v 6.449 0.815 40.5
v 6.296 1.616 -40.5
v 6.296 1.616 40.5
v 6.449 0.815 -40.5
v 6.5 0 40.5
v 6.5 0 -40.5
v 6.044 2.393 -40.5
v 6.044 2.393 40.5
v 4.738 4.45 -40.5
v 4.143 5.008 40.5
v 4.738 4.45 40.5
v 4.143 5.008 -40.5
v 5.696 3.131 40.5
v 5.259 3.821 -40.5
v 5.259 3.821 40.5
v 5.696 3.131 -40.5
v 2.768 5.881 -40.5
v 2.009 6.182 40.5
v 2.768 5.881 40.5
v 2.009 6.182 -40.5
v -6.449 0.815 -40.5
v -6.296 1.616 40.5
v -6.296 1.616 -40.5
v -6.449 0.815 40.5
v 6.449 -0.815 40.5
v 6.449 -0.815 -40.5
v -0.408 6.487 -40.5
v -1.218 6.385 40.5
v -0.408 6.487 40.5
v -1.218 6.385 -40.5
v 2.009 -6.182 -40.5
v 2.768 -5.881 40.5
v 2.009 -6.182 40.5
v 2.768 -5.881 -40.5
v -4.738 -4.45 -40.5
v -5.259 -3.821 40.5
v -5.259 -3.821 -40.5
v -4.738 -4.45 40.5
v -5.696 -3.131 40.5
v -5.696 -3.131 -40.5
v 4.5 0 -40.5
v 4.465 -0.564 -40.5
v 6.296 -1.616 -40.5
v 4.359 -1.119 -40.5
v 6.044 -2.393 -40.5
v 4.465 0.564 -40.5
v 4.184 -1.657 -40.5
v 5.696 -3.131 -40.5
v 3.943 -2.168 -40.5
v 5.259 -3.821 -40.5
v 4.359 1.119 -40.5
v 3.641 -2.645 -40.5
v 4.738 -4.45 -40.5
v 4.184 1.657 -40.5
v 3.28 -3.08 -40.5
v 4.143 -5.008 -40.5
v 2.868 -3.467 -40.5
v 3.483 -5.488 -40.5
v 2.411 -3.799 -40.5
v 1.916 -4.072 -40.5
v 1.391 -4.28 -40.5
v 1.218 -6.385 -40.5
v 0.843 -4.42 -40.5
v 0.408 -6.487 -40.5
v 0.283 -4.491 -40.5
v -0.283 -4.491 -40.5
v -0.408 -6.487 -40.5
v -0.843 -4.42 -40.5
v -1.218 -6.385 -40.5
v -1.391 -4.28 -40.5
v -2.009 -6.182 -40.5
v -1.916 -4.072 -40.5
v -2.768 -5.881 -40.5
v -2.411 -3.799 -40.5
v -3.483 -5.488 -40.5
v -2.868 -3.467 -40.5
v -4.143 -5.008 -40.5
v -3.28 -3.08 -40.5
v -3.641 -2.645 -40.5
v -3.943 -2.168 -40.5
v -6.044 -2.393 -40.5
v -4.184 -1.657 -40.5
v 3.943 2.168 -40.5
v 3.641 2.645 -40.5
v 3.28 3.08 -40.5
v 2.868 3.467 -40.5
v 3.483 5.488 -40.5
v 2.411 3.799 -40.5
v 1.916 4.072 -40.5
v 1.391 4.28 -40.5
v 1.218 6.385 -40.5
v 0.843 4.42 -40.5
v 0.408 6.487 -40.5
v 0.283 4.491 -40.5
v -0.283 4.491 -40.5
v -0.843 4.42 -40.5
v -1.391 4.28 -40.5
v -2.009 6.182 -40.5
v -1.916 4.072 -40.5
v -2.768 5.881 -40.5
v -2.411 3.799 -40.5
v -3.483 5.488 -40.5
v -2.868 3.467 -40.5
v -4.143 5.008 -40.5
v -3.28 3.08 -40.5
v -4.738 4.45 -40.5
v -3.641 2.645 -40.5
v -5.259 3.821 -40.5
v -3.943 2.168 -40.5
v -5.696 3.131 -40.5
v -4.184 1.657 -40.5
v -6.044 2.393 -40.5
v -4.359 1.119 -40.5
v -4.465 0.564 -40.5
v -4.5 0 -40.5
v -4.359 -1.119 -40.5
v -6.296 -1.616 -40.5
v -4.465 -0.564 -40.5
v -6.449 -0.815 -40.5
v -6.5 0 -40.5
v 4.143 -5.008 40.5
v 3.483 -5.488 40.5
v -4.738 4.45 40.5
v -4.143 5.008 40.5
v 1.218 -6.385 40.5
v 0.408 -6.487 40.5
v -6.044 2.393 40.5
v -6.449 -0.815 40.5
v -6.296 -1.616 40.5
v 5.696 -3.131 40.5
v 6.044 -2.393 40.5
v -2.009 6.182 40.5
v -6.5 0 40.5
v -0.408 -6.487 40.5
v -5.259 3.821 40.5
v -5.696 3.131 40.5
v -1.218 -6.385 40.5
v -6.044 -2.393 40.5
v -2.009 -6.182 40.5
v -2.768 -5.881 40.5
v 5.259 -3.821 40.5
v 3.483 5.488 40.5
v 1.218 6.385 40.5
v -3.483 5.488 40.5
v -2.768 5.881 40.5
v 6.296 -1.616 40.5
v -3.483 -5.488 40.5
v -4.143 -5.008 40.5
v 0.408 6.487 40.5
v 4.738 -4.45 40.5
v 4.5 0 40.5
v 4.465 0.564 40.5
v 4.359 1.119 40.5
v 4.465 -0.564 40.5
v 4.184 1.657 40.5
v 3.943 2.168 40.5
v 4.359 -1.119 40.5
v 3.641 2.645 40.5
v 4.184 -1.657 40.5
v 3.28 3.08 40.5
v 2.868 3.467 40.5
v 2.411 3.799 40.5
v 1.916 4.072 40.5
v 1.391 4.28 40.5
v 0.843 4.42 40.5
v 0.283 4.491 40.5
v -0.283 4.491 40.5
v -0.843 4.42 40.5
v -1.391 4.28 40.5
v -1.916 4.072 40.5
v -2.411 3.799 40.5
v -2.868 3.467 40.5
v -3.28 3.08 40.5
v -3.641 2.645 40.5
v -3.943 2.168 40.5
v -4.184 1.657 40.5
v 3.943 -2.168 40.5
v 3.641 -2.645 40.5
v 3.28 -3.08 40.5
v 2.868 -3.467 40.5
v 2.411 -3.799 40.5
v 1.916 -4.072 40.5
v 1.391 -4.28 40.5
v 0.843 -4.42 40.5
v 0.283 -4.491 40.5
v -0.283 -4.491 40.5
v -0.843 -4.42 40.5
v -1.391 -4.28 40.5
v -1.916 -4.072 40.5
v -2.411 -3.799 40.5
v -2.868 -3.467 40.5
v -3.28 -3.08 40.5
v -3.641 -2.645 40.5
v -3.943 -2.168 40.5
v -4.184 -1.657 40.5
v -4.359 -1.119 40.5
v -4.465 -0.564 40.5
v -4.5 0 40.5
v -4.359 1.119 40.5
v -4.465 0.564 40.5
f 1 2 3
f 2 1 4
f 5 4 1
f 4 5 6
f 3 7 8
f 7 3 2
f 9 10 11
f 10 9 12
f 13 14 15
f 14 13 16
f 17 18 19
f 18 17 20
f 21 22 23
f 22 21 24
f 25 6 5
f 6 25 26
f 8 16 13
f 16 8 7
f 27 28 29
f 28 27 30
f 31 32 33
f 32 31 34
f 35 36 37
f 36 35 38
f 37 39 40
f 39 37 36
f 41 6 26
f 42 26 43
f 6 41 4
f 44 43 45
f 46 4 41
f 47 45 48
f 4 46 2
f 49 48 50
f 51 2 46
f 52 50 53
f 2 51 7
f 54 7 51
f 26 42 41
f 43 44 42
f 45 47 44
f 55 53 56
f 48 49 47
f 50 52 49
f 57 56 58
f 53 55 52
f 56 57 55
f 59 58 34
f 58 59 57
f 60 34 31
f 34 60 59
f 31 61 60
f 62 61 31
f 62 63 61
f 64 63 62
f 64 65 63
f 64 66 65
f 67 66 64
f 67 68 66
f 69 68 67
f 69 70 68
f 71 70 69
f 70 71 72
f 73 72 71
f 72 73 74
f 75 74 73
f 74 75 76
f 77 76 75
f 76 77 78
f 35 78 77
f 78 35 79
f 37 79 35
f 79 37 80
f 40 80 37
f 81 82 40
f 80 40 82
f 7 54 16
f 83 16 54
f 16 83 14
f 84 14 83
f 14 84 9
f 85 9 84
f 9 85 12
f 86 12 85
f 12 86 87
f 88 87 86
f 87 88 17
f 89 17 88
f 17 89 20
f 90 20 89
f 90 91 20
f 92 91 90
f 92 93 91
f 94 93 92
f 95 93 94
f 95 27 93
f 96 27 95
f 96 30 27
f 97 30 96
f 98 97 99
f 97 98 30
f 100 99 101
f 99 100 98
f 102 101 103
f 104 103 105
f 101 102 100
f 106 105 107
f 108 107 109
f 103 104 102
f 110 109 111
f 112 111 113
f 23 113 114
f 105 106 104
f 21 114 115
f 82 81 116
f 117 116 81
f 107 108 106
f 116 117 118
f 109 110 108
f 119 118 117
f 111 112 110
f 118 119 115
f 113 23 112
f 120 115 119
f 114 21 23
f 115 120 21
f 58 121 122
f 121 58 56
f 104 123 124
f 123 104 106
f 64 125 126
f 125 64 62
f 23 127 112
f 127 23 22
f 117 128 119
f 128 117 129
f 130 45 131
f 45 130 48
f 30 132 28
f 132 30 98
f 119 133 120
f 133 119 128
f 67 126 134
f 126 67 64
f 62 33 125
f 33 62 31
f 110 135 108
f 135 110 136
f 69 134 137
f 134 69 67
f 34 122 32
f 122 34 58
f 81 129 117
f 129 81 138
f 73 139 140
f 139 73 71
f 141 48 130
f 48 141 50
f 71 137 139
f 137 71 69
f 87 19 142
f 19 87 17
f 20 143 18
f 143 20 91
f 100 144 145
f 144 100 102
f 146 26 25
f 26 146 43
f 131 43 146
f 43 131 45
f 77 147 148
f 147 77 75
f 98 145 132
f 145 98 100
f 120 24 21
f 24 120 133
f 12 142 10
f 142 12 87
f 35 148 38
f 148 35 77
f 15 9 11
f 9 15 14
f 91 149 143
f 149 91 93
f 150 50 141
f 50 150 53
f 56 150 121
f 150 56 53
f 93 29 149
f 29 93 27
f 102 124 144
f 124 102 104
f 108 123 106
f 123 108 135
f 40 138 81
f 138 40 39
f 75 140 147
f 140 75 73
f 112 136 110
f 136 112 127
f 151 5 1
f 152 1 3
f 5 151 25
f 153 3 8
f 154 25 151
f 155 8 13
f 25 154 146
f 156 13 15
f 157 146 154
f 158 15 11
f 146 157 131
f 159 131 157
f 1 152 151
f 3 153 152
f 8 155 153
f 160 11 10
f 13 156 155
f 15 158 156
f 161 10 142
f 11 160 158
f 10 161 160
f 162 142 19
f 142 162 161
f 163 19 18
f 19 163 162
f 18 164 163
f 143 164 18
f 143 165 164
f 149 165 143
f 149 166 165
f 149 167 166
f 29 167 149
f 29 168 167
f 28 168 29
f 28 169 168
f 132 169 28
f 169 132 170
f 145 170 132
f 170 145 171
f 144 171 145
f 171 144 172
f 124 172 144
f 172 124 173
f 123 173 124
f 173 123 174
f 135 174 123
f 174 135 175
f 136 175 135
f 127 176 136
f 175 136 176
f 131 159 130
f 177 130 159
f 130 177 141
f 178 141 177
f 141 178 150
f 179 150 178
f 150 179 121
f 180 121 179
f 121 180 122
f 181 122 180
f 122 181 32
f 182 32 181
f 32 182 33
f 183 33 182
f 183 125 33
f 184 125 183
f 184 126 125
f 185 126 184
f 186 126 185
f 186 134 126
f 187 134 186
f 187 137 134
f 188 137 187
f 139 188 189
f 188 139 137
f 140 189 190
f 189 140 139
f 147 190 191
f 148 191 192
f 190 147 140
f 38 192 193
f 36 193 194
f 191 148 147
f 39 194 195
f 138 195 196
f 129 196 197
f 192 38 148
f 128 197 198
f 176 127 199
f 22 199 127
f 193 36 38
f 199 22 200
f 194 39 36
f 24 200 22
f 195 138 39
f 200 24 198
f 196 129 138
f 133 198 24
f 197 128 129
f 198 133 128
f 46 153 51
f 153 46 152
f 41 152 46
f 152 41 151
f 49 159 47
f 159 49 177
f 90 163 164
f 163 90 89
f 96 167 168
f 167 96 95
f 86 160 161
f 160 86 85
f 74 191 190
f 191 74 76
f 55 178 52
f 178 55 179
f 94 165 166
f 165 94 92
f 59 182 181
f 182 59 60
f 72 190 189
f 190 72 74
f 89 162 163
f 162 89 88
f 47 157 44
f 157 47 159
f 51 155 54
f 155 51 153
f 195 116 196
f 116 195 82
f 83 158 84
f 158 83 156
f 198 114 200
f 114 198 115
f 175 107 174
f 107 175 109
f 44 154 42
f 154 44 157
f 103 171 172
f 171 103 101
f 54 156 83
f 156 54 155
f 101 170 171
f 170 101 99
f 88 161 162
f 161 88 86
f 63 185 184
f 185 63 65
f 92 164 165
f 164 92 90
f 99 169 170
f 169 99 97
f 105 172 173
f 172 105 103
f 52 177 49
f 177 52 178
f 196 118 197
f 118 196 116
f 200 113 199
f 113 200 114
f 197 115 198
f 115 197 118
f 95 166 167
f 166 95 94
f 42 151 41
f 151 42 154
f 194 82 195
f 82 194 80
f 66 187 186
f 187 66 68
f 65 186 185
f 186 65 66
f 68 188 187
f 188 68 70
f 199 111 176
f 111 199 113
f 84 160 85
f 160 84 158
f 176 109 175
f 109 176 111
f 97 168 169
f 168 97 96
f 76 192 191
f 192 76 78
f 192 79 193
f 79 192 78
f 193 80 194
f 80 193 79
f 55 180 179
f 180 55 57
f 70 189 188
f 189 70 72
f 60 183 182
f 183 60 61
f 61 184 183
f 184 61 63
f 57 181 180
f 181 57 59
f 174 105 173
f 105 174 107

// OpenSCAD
$fn = 50;


difference() {
	union() {
		translate(v = [0, 0, -40.5000000000]) {
			cylinder(h = 81, r = 6.5000000000);
		}
	}
	union() {
		translate(v = [0, 0, -100.0000000000]) {
			cylinder(h = 200, r = 4.5000000000);
		}
	}
}
